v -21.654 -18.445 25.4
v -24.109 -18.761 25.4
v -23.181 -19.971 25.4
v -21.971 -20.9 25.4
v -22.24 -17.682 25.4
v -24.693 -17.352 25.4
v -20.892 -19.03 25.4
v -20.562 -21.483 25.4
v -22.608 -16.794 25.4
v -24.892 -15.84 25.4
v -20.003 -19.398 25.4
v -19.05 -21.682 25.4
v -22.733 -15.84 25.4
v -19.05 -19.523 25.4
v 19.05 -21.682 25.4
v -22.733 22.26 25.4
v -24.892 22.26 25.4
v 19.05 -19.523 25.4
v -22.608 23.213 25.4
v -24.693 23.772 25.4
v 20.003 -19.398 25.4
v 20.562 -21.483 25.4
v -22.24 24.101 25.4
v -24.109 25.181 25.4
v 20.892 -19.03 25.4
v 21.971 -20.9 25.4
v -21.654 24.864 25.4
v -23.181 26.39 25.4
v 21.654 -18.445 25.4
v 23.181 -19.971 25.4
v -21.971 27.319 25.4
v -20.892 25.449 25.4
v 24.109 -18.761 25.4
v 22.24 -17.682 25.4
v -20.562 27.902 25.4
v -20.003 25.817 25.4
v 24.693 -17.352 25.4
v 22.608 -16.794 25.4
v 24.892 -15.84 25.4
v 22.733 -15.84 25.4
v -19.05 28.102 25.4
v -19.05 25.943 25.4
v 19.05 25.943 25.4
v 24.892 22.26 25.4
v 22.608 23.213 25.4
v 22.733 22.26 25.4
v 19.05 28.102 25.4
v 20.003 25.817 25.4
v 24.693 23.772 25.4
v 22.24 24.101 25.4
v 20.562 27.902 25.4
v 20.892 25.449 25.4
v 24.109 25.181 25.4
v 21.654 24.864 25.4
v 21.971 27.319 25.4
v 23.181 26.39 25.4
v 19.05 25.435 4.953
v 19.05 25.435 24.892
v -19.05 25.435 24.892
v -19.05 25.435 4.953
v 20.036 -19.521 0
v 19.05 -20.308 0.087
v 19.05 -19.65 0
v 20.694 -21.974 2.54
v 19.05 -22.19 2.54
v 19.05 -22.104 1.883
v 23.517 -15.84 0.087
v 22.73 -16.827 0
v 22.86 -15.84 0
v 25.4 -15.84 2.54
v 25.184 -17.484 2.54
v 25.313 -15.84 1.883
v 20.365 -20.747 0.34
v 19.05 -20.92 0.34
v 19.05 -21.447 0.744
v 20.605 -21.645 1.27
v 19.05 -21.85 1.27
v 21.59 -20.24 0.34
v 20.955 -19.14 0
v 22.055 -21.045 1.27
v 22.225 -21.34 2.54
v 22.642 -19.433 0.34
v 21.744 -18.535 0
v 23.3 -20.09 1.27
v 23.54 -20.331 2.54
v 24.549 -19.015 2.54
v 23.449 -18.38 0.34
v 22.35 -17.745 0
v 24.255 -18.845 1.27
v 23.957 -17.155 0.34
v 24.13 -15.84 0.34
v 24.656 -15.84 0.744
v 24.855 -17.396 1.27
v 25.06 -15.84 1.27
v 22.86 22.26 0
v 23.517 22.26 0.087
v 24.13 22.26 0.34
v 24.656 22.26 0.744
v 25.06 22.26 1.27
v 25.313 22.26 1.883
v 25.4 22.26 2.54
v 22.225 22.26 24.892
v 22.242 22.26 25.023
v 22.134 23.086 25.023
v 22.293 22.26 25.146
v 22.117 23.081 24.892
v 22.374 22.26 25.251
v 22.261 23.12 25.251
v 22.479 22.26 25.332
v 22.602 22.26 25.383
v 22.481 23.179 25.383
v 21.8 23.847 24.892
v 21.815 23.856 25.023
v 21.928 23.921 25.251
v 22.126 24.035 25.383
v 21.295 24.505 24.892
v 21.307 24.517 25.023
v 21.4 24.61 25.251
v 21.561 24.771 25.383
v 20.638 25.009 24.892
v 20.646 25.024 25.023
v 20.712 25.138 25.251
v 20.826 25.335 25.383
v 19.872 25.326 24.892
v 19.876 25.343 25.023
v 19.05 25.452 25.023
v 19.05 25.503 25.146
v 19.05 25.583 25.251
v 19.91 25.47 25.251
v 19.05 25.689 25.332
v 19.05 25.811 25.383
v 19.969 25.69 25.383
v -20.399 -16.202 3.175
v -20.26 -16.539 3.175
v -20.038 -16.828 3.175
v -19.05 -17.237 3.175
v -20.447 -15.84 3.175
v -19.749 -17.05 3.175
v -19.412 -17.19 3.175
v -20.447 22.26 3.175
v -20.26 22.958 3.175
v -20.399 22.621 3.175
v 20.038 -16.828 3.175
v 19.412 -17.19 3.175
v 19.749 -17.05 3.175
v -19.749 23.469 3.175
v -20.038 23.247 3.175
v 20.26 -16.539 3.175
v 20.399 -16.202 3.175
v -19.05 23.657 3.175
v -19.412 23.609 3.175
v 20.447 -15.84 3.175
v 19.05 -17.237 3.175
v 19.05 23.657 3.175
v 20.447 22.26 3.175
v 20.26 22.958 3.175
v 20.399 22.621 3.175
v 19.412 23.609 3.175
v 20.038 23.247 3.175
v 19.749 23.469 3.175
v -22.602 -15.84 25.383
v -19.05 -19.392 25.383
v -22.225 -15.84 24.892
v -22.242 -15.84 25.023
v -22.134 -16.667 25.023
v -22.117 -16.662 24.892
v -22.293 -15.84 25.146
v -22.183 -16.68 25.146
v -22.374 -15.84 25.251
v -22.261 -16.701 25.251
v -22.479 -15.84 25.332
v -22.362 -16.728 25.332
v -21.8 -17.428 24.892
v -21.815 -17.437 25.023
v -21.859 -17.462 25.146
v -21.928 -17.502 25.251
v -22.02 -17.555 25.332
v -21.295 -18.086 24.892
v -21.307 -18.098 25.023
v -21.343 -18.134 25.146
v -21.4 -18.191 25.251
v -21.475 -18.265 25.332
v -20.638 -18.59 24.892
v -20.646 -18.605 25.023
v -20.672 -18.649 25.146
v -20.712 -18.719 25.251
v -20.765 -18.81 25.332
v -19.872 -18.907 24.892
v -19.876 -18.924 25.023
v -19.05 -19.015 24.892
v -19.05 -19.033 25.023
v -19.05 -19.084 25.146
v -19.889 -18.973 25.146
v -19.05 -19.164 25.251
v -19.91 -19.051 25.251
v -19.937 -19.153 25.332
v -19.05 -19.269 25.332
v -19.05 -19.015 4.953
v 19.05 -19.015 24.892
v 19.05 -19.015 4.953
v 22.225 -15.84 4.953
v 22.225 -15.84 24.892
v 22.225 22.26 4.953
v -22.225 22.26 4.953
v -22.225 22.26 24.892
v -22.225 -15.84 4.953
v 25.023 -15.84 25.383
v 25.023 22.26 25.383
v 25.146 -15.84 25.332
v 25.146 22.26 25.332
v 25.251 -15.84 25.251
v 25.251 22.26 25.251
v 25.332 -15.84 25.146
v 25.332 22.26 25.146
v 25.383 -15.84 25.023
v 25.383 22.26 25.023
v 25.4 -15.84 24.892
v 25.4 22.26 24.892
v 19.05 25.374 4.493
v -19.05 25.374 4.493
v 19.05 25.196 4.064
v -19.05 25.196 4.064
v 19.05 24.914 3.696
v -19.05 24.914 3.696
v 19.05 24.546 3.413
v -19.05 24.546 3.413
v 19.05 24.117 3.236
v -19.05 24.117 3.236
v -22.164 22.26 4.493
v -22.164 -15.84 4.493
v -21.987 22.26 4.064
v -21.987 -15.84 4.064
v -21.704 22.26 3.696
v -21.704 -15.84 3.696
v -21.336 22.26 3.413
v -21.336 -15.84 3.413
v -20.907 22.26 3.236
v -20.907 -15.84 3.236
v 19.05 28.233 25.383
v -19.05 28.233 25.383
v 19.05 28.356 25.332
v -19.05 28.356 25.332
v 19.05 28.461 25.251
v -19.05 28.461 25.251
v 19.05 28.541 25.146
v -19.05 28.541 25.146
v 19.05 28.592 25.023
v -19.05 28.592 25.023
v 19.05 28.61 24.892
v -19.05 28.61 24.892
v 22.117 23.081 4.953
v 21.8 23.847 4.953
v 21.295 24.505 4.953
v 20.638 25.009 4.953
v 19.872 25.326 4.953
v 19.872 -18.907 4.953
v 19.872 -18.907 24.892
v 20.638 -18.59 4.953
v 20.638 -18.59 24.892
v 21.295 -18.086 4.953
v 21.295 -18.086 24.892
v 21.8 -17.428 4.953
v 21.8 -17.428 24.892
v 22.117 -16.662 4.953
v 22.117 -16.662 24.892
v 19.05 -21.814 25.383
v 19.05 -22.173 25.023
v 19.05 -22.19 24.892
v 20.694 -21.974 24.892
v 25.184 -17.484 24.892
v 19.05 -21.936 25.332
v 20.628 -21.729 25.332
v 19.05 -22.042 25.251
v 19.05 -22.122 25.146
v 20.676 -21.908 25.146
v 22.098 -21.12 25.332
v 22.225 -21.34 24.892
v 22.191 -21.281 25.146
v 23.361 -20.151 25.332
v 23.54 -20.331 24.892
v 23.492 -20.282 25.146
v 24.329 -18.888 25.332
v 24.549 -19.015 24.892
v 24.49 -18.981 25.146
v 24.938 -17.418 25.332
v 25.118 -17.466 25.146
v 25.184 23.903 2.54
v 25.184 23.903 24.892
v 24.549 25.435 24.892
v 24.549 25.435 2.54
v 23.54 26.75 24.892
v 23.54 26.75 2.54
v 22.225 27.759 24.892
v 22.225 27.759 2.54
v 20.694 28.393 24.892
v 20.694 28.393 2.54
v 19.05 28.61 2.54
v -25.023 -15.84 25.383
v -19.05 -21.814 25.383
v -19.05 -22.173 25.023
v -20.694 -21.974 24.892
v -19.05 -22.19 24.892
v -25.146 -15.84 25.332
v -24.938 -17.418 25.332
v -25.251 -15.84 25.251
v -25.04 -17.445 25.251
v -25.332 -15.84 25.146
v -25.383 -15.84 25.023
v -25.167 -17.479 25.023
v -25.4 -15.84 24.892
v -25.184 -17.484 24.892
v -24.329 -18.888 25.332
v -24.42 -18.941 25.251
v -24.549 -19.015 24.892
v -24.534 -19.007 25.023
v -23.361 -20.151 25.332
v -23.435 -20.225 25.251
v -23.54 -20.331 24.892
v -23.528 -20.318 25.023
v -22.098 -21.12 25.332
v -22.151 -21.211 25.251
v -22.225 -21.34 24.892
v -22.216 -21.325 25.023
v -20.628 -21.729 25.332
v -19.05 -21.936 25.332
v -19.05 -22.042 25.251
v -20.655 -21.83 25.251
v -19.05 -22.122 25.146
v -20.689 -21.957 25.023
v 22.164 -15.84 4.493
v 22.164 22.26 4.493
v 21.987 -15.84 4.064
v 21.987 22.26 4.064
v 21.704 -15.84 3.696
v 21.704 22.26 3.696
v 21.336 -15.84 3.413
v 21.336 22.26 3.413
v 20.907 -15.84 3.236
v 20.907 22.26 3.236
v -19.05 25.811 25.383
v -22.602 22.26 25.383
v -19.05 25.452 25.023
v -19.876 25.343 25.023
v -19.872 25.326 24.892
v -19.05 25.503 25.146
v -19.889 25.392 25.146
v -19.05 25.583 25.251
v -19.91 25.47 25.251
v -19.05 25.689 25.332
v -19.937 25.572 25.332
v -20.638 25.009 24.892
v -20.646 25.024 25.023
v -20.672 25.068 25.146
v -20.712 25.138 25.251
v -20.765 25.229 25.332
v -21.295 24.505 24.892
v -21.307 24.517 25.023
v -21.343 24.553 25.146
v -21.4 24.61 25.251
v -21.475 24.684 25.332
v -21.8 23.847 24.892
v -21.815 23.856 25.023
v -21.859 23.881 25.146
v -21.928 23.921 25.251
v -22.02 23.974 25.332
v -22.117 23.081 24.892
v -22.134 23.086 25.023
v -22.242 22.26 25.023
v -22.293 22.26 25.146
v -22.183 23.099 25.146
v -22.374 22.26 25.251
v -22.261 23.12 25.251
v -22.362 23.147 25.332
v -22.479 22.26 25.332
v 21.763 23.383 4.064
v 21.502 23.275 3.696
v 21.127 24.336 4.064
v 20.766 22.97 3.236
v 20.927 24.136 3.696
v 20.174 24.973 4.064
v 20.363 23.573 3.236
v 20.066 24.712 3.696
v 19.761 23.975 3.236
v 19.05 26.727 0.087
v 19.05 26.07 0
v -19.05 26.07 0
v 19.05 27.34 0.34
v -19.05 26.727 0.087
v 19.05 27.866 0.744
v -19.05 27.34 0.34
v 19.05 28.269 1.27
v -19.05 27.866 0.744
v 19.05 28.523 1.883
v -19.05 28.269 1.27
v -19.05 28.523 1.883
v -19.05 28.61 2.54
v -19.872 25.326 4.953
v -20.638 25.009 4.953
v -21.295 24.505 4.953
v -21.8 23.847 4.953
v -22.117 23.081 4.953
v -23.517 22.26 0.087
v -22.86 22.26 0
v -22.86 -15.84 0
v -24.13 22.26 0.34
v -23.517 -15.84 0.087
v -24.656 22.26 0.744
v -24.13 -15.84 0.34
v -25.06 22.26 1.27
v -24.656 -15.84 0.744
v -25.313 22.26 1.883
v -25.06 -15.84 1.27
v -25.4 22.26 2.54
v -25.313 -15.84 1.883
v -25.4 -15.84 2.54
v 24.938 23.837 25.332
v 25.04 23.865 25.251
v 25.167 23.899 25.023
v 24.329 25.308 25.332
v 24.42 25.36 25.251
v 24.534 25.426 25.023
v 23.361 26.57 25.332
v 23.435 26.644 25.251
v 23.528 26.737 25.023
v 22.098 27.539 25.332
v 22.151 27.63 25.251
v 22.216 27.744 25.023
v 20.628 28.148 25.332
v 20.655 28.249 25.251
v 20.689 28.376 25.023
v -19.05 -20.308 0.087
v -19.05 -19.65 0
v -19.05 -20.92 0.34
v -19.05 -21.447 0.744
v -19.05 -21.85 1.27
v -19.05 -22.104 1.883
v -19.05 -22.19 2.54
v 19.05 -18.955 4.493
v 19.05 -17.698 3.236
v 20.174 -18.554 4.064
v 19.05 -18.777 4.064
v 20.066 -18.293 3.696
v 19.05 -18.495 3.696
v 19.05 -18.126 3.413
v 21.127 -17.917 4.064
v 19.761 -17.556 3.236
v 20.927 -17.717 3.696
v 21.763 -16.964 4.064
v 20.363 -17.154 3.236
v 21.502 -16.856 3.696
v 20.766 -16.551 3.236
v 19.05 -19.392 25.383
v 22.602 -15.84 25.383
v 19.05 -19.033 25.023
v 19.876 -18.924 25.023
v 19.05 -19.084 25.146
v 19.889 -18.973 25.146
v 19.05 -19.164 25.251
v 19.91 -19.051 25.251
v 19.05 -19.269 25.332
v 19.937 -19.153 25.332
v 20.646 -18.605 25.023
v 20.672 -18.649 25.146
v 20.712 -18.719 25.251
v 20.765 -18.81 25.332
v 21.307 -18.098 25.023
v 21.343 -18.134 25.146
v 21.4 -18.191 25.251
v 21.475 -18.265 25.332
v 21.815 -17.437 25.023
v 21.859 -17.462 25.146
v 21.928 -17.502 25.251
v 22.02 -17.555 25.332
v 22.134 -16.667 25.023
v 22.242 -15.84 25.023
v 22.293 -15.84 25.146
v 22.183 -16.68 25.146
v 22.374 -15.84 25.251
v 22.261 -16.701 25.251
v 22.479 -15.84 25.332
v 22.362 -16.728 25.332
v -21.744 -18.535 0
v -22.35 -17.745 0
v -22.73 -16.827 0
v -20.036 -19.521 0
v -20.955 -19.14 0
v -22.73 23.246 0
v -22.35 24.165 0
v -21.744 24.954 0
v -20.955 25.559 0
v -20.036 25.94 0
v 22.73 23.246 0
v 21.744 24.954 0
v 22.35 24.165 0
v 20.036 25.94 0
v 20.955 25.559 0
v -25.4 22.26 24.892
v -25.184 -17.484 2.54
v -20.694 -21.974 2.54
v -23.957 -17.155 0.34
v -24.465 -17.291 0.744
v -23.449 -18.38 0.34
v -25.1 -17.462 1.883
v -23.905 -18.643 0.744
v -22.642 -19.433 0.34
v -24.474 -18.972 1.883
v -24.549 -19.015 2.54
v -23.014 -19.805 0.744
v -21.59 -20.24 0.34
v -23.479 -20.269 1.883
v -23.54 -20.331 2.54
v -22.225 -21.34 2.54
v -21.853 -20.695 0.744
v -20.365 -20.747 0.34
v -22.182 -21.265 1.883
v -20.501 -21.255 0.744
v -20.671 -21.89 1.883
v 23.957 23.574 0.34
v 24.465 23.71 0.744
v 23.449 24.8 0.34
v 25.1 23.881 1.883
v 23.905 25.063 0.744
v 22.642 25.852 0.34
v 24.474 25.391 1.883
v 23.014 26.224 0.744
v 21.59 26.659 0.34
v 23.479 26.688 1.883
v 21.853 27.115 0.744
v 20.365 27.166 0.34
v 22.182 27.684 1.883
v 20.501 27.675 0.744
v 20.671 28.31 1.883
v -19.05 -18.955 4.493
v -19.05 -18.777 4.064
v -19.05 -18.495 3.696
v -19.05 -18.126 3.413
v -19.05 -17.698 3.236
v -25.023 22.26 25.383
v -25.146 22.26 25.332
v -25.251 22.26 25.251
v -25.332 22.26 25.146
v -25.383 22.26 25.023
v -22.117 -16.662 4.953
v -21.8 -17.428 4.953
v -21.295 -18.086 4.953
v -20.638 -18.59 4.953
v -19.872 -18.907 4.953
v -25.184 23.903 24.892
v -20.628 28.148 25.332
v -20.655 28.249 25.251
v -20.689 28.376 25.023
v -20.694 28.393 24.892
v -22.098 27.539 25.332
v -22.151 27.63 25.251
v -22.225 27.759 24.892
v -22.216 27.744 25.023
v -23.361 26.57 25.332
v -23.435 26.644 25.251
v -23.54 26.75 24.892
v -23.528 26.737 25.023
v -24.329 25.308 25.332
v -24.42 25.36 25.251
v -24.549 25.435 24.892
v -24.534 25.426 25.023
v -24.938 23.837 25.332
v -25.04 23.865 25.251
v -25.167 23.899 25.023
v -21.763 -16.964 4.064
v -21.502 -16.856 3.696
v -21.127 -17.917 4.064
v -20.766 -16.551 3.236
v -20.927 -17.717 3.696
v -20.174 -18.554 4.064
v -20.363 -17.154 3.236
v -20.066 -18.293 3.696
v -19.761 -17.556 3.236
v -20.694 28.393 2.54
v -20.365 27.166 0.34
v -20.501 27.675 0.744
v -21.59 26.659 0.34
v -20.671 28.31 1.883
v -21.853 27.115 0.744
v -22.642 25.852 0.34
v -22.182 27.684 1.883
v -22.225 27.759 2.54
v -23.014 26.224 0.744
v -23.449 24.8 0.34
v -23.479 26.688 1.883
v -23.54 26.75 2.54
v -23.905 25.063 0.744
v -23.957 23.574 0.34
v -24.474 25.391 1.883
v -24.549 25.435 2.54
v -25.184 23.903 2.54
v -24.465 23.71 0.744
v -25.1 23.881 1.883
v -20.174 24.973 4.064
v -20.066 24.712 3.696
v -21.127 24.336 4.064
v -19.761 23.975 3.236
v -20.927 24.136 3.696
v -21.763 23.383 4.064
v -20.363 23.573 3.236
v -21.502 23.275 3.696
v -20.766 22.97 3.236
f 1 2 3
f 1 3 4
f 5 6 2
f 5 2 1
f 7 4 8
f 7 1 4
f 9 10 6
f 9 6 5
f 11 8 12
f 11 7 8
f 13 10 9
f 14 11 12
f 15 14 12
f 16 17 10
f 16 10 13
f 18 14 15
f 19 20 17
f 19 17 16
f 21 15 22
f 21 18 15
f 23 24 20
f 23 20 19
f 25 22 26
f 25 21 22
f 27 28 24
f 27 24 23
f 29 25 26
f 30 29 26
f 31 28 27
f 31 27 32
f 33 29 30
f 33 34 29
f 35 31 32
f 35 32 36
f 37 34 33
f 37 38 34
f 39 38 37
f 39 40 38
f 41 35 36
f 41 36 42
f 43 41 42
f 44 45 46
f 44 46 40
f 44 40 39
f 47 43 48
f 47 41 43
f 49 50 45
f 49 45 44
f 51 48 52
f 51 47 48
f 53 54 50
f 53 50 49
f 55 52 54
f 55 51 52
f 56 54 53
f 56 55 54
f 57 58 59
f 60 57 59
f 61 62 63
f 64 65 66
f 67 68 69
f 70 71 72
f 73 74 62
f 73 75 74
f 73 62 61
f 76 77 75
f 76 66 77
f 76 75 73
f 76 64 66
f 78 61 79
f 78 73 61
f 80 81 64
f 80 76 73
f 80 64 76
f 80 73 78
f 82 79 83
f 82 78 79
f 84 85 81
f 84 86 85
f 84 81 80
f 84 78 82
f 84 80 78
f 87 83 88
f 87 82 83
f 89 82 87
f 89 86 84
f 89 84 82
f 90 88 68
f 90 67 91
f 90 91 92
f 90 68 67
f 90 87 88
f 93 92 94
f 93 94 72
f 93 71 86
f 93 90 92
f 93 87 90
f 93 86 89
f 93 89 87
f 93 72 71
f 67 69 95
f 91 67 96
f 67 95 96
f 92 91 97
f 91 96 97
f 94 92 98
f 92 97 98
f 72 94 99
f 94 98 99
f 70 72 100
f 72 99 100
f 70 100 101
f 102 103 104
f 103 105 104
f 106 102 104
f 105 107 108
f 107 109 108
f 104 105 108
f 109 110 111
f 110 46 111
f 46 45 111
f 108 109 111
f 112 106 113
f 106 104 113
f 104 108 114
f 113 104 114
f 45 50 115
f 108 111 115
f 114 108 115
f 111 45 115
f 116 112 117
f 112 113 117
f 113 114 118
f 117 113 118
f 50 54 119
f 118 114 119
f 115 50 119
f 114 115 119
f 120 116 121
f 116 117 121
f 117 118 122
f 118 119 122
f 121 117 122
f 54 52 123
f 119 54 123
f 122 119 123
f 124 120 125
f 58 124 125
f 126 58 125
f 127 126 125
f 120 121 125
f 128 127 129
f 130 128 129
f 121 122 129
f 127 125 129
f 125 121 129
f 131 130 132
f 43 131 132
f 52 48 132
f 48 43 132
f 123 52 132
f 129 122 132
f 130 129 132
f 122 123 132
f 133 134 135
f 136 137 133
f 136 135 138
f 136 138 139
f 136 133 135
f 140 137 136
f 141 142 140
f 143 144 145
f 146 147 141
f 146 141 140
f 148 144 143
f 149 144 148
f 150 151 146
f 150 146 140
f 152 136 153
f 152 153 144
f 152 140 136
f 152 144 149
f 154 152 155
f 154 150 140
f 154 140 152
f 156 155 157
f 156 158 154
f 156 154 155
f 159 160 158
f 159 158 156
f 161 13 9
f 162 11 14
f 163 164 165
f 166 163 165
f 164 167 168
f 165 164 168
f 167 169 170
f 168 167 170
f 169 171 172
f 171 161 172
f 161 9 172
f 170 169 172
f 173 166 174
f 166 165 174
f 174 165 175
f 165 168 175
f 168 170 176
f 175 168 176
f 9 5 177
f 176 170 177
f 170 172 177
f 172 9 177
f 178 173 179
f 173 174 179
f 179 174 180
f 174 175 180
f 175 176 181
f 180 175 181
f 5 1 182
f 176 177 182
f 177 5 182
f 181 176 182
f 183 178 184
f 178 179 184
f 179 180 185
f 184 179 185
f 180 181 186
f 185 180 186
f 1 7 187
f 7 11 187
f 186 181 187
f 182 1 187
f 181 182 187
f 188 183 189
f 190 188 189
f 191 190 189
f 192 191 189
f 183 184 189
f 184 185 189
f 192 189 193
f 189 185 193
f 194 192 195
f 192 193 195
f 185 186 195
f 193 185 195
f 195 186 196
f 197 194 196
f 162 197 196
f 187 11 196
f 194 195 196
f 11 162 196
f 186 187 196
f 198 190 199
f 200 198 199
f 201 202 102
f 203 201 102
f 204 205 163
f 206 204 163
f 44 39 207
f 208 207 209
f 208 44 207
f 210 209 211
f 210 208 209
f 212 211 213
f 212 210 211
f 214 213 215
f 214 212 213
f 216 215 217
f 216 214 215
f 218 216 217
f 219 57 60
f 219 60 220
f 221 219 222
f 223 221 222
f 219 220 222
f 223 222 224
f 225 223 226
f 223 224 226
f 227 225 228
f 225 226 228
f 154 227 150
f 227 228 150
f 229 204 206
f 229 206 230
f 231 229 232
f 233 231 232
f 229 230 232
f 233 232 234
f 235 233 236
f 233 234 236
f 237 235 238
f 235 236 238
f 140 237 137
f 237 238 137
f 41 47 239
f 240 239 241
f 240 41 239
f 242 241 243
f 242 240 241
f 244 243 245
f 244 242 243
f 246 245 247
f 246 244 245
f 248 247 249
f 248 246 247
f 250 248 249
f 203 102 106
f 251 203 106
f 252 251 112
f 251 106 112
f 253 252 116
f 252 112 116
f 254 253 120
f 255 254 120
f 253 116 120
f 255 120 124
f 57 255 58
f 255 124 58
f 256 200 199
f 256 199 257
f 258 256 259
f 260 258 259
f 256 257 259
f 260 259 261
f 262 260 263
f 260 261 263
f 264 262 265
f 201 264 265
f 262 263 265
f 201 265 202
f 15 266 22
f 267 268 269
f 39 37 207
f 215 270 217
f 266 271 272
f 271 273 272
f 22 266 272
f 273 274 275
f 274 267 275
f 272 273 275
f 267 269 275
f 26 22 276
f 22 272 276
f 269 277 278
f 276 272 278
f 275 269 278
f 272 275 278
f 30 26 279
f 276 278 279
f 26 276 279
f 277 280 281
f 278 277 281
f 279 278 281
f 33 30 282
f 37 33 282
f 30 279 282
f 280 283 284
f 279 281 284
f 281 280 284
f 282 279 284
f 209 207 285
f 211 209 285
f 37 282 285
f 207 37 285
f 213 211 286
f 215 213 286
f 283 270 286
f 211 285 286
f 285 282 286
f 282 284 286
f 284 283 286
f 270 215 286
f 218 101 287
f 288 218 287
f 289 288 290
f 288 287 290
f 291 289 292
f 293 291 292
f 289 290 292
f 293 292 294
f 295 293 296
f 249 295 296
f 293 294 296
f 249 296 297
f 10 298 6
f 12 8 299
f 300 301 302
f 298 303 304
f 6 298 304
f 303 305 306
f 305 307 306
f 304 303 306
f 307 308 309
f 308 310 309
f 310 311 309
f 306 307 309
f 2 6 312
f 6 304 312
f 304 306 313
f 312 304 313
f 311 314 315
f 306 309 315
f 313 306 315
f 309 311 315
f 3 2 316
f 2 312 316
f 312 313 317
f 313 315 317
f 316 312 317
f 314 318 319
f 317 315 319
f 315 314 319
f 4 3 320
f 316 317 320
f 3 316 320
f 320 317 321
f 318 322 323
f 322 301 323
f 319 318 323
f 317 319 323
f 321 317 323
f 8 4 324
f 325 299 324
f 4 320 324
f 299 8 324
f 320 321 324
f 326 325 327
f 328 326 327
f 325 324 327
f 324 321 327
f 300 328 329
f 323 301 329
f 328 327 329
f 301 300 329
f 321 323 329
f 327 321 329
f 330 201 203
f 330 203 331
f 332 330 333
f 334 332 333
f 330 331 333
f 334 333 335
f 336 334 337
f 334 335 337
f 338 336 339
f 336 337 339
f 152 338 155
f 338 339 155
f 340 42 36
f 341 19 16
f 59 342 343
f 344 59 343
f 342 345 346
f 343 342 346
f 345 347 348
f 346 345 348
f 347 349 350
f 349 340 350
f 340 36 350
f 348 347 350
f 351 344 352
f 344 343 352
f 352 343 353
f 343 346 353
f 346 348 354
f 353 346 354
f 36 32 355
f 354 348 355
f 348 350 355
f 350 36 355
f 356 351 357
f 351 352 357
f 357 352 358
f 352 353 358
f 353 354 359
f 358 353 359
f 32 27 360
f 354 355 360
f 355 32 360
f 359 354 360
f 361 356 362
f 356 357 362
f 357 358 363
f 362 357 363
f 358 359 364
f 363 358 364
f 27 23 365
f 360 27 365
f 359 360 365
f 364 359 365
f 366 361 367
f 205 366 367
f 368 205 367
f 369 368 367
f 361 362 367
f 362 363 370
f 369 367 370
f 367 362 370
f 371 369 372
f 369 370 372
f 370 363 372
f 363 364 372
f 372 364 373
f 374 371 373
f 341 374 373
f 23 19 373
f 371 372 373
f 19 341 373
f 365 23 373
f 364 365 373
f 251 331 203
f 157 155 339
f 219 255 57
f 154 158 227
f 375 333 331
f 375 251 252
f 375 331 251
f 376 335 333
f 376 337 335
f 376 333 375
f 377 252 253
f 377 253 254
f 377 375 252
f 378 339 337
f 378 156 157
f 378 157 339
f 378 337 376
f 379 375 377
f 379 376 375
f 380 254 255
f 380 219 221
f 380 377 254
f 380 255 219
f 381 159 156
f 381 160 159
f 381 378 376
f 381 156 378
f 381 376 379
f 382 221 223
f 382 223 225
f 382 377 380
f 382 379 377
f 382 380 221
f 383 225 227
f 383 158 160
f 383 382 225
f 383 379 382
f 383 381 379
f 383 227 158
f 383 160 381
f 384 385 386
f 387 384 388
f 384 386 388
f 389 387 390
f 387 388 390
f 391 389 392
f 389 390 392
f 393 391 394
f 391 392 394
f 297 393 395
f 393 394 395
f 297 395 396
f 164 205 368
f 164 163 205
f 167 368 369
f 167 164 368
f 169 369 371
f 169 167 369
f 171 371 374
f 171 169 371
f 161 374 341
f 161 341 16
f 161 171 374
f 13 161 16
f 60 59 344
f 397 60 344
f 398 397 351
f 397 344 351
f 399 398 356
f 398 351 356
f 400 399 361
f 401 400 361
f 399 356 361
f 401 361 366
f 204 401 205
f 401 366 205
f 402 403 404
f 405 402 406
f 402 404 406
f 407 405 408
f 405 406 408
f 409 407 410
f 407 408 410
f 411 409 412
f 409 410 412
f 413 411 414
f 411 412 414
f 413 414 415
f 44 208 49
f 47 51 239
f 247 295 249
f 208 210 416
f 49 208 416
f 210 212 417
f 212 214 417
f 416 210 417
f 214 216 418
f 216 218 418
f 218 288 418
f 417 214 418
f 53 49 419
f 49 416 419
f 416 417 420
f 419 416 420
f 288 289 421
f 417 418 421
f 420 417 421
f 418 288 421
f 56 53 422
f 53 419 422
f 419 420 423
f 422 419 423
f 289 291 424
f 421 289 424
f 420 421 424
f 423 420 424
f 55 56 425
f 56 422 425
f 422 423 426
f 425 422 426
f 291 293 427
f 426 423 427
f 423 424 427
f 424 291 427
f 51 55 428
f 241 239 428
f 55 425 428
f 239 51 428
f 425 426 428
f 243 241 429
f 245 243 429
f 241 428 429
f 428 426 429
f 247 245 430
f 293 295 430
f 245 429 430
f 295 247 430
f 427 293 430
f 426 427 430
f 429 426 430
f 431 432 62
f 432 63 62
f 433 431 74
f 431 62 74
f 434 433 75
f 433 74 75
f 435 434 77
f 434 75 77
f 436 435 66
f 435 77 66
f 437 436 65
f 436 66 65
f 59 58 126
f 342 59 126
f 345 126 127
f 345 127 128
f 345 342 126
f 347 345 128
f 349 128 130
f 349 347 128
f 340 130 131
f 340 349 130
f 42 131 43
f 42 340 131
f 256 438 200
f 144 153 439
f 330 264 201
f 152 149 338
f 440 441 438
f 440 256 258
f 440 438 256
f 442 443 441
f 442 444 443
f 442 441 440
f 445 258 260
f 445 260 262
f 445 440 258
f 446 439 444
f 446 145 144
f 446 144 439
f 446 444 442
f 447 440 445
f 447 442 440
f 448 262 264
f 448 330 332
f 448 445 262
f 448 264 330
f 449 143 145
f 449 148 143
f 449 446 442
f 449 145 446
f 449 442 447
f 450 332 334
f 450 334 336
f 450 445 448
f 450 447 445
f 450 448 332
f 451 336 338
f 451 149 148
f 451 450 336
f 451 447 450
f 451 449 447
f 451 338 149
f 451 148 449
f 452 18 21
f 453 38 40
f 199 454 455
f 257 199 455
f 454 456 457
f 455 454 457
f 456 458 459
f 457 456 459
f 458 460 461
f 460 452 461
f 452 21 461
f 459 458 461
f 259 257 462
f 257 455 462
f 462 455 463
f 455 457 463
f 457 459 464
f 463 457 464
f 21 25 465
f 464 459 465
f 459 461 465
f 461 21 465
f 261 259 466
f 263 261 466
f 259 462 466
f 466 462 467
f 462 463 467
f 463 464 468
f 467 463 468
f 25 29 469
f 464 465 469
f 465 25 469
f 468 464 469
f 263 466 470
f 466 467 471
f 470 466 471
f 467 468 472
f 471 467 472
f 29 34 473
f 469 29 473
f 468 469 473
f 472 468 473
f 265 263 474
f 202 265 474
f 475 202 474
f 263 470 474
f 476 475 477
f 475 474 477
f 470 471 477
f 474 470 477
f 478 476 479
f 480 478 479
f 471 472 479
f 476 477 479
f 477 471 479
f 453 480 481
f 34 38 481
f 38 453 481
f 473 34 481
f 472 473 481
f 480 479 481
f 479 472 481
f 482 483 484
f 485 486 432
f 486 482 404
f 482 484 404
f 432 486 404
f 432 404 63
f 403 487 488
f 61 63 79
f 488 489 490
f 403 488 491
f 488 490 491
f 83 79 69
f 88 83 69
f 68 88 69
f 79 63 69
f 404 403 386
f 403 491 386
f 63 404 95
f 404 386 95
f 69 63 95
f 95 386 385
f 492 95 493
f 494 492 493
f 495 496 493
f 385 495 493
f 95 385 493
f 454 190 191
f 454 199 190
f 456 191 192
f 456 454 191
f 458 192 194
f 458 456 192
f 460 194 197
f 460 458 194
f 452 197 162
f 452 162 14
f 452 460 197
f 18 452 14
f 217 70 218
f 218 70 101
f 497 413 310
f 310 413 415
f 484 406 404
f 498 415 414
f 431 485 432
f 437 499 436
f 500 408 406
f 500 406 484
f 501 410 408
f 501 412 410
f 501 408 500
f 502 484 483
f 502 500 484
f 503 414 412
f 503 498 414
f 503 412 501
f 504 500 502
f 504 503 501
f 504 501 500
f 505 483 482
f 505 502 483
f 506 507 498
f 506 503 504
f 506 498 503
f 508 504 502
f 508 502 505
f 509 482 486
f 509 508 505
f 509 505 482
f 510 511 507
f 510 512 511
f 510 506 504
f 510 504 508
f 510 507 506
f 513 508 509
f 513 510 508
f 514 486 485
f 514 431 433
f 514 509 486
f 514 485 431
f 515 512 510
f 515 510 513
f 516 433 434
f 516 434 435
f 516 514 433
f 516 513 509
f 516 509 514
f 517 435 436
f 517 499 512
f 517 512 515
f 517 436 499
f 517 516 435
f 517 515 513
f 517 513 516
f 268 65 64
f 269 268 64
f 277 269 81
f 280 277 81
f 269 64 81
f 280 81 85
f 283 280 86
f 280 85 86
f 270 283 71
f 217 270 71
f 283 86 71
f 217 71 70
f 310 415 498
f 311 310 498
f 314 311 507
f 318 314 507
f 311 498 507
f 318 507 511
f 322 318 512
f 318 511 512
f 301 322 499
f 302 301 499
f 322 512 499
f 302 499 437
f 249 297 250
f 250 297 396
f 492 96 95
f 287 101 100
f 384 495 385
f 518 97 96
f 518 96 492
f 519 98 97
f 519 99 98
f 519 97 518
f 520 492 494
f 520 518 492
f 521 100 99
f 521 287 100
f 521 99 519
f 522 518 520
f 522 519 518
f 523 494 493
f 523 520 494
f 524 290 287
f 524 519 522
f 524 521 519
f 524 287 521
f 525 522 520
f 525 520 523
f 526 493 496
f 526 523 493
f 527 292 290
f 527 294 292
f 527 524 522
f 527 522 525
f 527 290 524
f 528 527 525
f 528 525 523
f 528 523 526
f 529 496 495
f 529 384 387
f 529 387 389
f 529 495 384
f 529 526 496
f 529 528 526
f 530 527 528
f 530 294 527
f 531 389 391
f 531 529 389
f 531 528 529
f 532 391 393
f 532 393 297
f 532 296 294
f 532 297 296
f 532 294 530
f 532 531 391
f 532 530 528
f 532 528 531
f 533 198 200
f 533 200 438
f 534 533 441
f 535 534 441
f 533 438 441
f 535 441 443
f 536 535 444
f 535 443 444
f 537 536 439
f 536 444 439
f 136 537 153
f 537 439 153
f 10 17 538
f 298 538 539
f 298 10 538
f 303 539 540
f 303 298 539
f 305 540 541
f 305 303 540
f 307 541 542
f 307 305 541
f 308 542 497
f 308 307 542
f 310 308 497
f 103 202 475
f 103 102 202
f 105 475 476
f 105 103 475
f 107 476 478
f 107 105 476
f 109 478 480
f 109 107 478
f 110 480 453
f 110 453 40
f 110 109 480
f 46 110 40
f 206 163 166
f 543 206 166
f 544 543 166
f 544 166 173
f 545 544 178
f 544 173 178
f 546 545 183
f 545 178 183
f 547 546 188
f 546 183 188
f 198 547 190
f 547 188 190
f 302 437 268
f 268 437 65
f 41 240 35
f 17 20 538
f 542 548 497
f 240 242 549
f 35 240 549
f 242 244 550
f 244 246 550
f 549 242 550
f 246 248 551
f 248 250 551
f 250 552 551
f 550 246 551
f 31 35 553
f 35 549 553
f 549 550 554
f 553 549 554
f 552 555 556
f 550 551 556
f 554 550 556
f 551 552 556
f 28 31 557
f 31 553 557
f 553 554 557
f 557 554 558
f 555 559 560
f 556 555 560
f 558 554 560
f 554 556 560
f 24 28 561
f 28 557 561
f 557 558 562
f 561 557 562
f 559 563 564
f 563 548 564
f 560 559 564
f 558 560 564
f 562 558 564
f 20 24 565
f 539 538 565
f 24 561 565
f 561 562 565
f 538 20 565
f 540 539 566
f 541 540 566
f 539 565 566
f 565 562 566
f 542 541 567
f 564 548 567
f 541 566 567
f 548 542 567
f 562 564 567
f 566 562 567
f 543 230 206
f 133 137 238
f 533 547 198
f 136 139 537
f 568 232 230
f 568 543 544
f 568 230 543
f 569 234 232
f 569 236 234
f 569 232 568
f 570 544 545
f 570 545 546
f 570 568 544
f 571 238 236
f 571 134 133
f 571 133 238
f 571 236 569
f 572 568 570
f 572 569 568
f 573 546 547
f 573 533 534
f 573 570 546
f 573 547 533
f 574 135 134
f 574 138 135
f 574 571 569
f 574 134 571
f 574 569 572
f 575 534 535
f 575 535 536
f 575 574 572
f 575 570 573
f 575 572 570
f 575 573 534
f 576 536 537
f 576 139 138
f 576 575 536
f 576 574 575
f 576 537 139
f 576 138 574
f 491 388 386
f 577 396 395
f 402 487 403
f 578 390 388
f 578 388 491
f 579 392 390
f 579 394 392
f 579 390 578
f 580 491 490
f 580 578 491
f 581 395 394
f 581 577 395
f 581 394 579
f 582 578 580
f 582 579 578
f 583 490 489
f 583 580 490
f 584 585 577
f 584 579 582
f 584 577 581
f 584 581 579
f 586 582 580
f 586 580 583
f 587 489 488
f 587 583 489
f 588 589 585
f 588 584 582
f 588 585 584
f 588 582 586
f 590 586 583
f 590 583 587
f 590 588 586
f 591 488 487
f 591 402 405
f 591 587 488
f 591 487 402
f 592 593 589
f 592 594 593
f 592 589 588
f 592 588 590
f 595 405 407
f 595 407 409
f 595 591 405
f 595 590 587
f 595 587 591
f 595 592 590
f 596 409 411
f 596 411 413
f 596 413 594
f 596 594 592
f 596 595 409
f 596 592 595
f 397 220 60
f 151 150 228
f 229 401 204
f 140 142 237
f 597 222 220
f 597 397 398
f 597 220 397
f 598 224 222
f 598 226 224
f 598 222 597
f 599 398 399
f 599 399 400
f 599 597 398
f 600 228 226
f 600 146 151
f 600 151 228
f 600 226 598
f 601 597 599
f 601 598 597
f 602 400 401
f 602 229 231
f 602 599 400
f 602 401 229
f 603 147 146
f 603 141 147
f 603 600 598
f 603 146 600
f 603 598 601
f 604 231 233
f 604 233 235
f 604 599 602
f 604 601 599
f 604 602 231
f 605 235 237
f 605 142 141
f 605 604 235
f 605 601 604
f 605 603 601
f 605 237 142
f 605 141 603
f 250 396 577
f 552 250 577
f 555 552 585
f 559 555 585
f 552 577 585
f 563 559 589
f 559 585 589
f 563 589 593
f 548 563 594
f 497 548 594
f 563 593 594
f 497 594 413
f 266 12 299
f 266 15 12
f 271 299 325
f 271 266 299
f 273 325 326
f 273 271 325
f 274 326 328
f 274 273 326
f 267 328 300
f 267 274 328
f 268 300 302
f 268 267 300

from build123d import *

# Parameters (mm, degrees)
F1_DEPTH = 25.4
F3_DEPTH = 22.225
F4_R     = 2.54
F5_R     = 1.778
F6_R     = 0.508


with BuildPart() as f1:
    # F0 (on Top) → F1 (new body)
    with BuildSketch(Plane.XY):
        with BuildLine():
            ThreePointArc((25.4, 22.2595424831), (23.5401280605, 26.7496705436), (19.05, 28.6095424831))
            Line((19.05, 28.6095424831), (-19.05, 28.6095424831))
            ThreePointArc((-19.05, 28.6095424831), (-23.5401280605, 26.7496705436), (-25.4, 22.2595424831))
            Line((-25.4, 22.2595424831), (-25.4, -15.8404575169))
            ThreePointArc((-25.4, -15.8404575169), (-23.5401280605, -20.3305855774), (-19.05, -22.1904575169))
            Line((-19.05, -22.1904575169), (19.05, -22.1904575169))
            ThreePointArc((19.05, -22.1904575169), (23.5401280605, -20.3305855774), (25.4, -15.8404575169))
            Line((25.4, -15.8404575169), (25.4, 22.2595424831))
        make_face()
    extrude(amount=F1_DEPTH)

    # F2 (on face) → F3 (cut)
    with BuildSketch(Plane.XY.offset(25.4)):
        with BuildLine():
            Line((19.05, 25.4345424831), (-19.05, 25.4345424831))
            ThreePointArc((-19.05, 25.4345424831), (-21.2950640303, 24.5046065134), (-22.225, 22.2595424831))
            Line((-22.225, 22.2595424831), (-22.225, -15.8404575169))
            ThreePointArc((-22.225, -15.8404575169), (-21.2950640303, -18.0855215472), (-19.05, -19.0154575169))
            Line((-19.05, -19.0154575169), (19.05, -19.0154575169))
            ThreePointArc((19.05, -19.0154575169), (21.2950640303, -18.0855215472), (22.225, -15.8404575169))
            Line((22.225, -15.8404575169), (22.225, 22.2595424831))
            ThreePointArc((22.225, 22.2595424831), (21.2950640303, 24.5046065134), (19.05, 25.4345424831))
        make_face()
    extrude(amount=-F3_DEPTH, mode=Mode.SUBTRACT)

    # F4
    f4_edges = [f1.edges().sort_by_distance(p)[0] for p in [
        (23.540128, -20.330586, 0),
        (25.4, 3.209542, 0),
        (23.540128, 26.749671, 0),
        (0, 28.609542, 0),
        (-23.540128, 26.749671, 0),
        (-25.4, 3.209542, 0),
        (-23.540128, -20.330586, 0),
        (0, -22.190458, 0),
    ]]
    fillet(f4_edges, radius=F4_R)

    # F5
    f5_edges = [f1.edges().sort_by_distance(p)[0] for p in [
        (0, 25.434542, 3.175),
        (-21.295064, 24.504607, 3.175),
        (-22.225, 3.209542, 3.175),
        (-21.295064, -18.085522, 3.175),
        (0, -19.015458, 3.175),
        (21.295064, -18.085522, 3.175),
        (22.225, 3.209542, 3.175),
        (21.295064, 24.504607, 3.175),
    ]]
    fillet(f5_edges, radius=F5_R)

    # F6
    f6_edges = [f1.edges().sort_by_distance(p)[0] for p in [
        (23.540128, -20.330586, 25.4),
        (0, -22.190458, 25.4),
        (25.4, 3.209542, 25.4),
        (-23.540128, -20.330586, 25.4),
        (23.540128, 26.749671, 25.4),
        (-25.4, 3.209542, 25.4),
        (0, 28.609542, 25.4),
        (-23.540128, 26.749671, 25.4),
        (0, 25.434542, 25.4),
        (-21.295064, 24.504607, 25.4),
        (-22.225, 3.209542, 25.4),
        (-21.295064, -18.085522, 25.4),
        (0, -19.015458, 25.4),
        (21.295064, -18.085522, 25.4),
        (22.225, 3.209542, 25.4),
        (21.295064, 24.504607, 25.4),
    ]]
    fillet(f6_edges, radius=F6_R)


solid = f1.part
